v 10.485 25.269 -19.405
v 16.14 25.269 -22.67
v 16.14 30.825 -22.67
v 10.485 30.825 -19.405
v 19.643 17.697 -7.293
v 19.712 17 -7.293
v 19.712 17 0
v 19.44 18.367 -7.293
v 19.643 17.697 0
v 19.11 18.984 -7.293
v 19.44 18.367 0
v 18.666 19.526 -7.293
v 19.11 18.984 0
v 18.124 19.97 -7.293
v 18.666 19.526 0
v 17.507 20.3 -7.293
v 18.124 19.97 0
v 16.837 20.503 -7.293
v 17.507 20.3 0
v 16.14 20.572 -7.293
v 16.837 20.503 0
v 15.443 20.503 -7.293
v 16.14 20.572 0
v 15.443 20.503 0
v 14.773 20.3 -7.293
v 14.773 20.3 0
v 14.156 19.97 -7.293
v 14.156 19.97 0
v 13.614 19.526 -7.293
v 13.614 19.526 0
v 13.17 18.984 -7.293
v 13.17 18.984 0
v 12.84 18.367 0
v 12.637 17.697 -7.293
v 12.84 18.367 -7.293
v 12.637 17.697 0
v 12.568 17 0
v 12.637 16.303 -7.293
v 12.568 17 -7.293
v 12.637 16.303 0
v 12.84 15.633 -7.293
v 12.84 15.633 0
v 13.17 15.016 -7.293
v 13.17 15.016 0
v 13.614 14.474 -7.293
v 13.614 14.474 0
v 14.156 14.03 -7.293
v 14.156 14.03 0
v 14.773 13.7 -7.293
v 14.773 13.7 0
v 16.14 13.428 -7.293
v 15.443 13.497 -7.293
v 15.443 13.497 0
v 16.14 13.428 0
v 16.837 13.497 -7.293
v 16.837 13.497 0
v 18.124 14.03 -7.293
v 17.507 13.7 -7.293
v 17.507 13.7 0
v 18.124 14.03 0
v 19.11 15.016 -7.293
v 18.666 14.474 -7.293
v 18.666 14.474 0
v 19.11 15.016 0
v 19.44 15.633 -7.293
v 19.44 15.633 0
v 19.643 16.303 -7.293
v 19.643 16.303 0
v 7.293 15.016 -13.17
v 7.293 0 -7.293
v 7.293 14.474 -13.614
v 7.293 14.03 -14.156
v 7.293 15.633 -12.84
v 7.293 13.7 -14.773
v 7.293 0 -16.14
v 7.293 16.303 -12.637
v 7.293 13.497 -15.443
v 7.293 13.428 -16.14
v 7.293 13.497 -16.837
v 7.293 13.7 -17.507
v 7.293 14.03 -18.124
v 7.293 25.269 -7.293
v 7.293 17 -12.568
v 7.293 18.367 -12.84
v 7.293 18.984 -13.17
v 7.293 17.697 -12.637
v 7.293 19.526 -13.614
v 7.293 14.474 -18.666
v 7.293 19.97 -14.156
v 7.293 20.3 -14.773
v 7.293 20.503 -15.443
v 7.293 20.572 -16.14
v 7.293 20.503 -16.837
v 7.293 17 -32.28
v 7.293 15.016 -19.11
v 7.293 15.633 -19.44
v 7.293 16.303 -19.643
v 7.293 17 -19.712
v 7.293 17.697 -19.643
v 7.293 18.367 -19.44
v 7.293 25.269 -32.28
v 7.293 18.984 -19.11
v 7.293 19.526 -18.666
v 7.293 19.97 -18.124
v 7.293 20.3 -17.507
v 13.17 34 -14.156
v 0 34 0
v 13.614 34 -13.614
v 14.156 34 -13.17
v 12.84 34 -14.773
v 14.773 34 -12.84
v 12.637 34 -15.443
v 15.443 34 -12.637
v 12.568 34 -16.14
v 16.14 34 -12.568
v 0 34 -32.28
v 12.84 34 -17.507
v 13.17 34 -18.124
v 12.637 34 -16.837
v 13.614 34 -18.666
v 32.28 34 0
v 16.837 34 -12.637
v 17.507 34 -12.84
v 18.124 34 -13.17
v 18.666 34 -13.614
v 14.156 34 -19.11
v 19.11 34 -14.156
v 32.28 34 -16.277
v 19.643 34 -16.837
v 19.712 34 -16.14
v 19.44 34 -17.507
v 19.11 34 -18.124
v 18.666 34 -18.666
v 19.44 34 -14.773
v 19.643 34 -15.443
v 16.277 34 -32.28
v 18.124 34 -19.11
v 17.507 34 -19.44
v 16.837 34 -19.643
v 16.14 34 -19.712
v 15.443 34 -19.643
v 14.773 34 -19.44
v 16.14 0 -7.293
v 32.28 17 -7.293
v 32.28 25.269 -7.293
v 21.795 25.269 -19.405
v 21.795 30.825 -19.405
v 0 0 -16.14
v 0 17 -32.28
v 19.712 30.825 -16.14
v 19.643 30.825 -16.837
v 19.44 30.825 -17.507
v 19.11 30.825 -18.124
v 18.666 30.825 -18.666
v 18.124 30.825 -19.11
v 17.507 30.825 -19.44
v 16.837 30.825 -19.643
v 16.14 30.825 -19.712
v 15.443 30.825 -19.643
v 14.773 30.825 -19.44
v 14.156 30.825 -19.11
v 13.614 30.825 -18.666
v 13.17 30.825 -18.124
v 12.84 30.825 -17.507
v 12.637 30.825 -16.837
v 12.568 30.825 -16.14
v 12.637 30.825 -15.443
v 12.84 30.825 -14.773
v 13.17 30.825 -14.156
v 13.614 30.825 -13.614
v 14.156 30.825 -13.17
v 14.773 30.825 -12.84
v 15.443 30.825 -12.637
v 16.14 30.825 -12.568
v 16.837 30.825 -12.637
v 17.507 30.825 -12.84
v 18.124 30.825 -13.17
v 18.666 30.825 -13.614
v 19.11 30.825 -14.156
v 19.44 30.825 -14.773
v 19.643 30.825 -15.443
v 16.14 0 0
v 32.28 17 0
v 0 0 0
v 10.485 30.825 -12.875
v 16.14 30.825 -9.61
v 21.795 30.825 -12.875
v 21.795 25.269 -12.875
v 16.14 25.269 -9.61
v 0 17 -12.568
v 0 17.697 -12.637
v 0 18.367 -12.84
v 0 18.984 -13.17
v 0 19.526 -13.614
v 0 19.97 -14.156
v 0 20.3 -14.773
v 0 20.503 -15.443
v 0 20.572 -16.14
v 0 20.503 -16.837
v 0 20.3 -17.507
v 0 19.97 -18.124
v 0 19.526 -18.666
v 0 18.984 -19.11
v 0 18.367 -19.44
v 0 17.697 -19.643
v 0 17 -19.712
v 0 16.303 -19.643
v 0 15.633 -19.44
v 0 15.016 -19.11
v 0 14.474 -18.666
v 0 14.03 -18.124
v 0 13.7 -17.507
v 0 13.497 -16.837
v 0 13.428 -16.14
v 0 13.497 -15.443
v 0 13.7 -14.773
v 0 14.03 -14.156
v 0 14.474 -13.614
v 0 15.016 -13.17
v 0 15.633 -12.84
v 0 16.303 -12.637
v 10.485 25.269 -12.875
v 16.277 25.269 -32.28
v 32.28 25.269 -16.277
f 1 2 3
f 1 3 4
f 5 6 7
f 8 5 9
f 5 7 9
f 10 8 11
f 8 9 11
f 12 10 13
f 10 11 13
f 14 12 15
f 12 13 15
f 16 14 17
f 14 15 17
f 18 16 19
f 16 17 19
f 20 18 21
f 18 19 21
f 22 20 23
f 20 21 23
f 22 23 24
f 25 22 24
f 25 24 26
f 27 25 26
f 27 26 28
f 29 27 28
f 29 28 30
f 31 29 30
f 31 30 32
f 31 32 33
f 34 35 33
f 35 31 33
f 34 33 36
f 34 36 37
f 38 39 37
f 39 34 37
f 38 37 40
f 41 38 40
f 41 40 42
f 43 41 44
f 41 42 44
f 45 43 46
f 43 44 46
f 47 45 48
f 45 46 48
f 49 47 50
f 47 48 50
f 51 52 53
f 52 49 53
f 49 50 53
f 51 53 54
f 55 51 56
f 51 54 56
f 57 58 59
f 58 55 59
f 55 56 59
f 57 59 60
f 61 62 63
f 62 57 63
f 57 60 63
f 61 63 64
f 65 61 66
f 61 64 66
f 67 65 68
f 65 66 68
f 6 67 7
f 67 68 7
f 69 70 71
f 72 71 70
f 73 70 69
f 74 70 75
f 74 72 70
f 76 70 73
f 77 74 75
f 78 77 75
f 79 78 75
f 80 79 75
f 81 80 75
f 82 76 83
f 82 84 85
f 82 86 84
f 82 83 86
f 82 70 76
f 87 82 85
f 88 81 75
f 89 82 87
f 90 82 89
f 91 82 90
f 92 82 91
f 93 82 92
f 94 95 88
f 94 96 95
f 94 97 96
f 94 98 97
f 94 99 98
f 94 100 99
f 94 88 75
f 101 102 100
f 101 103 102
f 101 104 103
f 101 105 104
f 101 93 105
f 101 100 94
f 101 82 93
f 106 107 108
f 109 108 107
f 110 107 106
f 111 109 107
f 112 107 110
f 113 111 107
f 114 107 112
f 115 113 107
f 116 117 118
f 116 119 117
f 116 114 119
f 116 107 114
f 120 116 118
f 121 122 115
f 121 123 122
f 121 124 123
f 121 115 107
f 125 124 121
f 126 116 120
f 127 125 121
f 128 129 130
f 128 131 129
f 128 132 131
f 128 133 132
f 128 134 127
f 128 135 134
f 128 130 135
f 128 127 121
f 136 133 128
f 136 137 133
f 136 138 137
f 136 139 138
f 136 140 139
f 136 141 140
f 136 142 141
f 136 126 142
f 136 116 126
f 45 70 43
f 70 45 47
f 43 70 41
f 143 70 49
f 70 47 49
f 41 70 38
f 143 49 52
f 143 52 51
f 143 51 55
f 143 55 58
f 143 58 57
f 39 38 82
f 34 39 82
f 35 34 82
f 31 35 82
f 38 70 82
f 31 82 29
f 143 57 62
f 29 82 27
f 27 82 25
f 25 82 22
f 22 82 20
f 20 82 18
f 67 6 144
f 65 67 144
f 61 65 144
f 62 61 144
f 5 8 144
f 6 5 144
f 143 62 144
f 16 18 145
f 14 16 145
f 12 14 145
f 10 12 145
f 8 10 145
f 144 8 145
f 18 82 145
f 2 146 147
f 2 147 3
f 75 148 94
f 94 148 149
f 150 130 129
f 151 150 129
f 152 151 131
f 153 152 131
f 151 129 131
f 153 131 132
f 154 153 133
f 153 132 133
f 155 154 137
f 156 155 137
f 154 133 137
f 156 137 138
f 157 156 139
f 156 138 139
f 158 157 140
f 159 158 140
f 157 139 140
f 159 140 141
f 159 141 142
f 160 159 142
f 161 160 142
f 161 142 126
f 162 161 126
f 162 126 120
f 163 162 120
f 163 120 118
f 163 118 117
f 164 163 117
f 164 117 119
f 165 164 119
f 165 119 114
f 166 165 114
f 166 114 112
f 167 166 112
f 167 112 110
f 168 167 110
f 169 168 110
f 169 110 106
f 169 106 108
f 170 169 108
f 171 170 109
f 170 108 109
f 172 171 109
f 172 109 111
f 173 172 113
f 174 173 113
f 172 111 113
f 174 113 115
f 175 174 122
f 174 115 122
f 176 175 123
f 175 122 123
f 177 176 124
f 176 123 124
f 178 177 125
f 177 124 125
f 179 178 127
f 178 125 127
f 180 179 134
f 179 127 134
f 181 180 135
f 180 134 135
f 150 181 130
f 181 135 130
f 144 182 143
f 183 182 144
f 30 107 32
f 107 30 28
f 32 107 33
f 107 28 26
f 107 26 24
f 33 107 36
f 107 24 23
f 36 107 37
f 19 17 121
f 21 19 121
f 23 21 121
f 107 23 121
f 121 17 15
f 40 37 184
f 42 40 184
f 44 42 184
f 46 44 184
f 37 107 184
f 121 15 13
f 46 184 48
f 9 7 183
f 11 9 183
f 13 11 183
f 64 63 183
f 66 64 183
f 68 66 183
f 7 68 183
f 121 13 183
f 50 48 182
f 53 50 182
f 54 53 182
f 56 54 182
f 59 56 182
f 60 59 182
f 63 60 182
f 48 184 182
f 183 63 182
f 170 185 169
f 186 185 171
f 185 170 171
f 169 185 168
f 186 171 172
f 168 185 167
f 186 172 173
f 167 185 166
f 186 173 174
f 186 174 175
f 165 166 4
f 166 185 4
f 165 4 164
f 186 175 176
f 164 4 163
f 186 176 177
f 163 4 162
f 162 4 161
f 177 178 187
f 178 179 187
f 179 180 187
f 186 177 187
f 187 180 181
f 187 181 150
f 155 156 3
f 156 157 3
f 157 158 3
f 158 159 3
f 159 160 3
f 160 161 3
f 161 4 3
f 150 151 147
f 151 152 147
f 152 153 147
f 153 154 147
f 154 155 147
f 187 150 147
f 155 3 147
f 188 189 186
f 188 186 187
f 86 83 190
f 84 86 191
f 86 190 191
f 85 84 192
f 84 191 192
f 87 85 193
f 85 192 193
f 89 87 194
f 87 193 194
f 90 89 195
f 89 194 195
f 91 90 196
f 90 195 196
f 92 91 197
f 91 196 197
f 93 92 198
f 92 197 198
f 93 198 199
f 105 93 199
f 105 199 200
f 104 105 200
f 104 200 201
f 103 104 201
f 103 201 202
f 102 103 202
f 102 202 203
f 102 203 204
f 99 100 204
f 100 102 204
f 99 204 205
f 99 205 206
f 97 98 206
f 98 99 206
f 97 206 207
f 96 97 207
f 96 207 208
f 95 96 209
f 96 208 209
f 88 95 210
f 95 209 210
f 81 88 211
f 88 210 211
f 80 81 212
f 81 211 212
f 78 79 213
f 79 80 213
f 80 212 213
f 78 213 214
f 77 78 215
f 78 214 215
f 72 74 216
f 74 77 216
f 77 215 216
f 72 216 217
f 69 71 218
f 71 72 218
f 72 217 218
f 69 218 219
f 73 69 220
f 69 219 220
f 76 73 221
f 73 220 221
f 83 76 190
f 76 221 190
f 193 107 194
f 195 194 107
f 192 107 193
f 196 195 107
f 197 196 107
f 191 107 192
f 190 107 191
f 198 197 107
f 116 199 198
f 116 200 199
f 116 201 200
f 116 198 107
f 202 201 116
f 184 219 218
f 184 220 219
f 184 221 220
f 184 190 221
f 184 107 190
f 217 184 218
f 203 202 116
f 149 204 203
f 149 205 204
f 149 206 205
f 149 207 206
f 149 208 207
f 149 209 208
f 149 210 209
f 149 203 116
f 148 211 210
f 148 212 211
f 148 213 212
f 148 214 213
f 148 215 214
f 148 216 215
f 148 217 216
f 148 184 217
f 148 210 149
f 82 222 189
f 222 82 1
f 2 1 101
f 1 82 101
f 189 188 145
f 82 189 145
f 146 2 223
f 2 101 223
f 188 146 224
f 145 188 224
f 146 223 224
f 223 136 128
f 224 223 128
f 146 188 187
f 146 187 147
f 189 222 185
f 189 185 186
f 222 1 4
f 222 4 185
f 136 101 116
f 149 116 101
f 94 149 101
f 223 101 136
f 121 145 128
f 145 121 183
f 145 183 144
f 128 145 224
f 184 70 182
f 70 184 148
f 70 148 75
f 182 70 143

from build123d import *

# Parameters (mm, degrees)
SKETCH1_W                    = 32.28
SKETCH1_H                    = 32.28
MAIN_BODY_DEPTH              = 34
SKETCH3_R                    = 3.571875
F_9_32_RIGHT_RAIL_DEPTH      = 1
F_9_32_RIGHT_RAIL_DEPTH_BACK = 8.334375
SKETCH4_R                    = 3.571875
F_9_32_LEFT_RAIL_DEPTH       = 8.334375
SKETCH8_R                    = 3.571875
F_9_32_TOPPER_DEPTH          = 1
F_9_32_TOPPER_DEPTH_BACK     = 10
INNER_START                  = -17.4625
SKETCH13_W                   = 24.987421875
SKETCH13_H                   = 24.987421875
INNER_CAVITY_DEPTH           = 8.73125
INNER_CAVITY_DEPTH_BACK      = 34
HEX_START                    = -17
HEX_HOLE_TOP_DEPTH           = 13.825
TOP_CORNER_REACH             = 36
CUT_EXTRUDE2_DEPTH           = 7.292578
CUT_EXTRUDE3_DEPTH           = 7.292578


with BuildPart() as part:
    # Sketch1 → Main Body (new body)
    with BuildSketch(Plane(origin=(0, 0, 0), x_dir=(1, 0, 0), z_dir=(0, 1, 0))):
        with Locations((16.14, 16.14)):
            Rectangle(SKETCH1_W, SKETCH1_H)
    extrude(amount=MAIN_BODY_DEPTH)

    # Sketch3 → 9/32 Right Rail (cut, two sides)
    with BuildSketch(Plane.XY) as f_9_32_right_rail_sk:
        with Locations((16.14, 17)):
            Circle(SKETCH3_R)
    extrude(amount=F_9_32_RIGHT_RAIL_DEPTH, mode=Mode.SUBTRACT)
    extrude(f_9_32_right_rail_sk.sketch, amount=-F_9_32_RIGHT_RAIL_DEPTH_BACK, mode=Mode.SUBTRACT)

    # Sketch4 → 9/32 Left Rail (cut)
    with BuildSketch(Plane.ZY):
        with Locations((-16.14, 17)):
            Circle(SKETCH4_R)
    extrude(amount=-F_9_32_LEFT_RAIL_DEPTH, mode=Mode.SUBTRACT)

    # Sketch8 → 9/32 Topper (cut, two sides)
    with BuildSketch(Plane(origin=(0, 34, 0), x_dir=(1, 0, 0), z_dir=(0, 1, 0))) as f_9_32_topper_sk:
        with Locations((16.14, 16.14)):
            Circle(SKETCH8_R)
    extrude(amount=F_9_32_TOPPER_DEPTH, mode=Mode.SUBTRACT)
    extrude(f_9_32_topper_sk.sketch, amount=-F_9_32_TOPPER_DEPTH_BACK, mode=Mode.SUBTRACT)

    # Sketch13 → Inner Cavity (cut, two sides)
    with BuildSketch(Plane(origin=(0, 34, 0), x_dir=(1, 0, 0), z_dir=(0, 1, 0)).offset(INNER_START)) as inner_cavity_sk:
        with Locations((19.786289062, 19.786289062)):
            Rectangle(SKETCH13_W, SKETCH13_H)
    extrude(amount=INNER_CAVITY_DEPTH, mode=Mode.SUBTRACT)
    extrude(inner_cavity_sk.sketch, amount=-INNER_CAVITY_DEPTH_BACK, mode=Mode.SUBTRACT)

    # Sketch14 → Hex Hole Top (cut)
    with BuildSketch(Plane(origin=(0, 34, 0), x_dir=(1, 0, 0), z_dir=(0, 1, 0)).offset(HEX_START)):
        Polygon((21.79546875, 19.405186405), (16.14, 22.67037281), (10.48453125, 19.405186405), (10.48453125, 12.874813595), (16.14, 9.60962719), (21.79546875, 12.874813595), align=None)
    extrude(amount=HEX_HOLE_TOP_DEPTH, mode=Mode.SUBTRACT)

    # Sketch16 → Top Corner (cut, up to next)
    with BuildSketch(Plane(origin=(0, 34, 0), x_dir=(1, 0, 0), z_dir=(0, 1, 0)), mode=Mode.PRIVATE) as top_corner_sk1:
        Polygon((32.28, 32.28), (16.276714219, 32.28), (32.28, 16.276714219), align=None)
    top_corner_tool1 = extrude(top_corner_sk1.sketch, amount=-TOP_CORNER_REACH, mode=Mode.PRIVATE) & part.part
    add(top_corner_tool1.solids().sort_by_distance((26.945571, 34, -26.945571))[0], mode=Mode.SUBTRACT)

    # Sketch18 → Cut-Extrude2 (cut)
    with BuildSketch(Plane.ZY):
        Polygon((-32.28, 0), (-16.14, 0), (-32.28, 17), align=None)
    extrude(amount=-CUT_EXTRUDE2_DEPTH, mode=Mode.SUBTRACT)

    # Sketch19 → Cut-Extrude3 (cut)
    with BuildSketch(Plane.XY):
        Polygon((32.28, 0), (16.14, 0), (32.28, 17), align=None)
    extrude(amount=-CUT_EXTRUDE3_DEPTH, mode=Mode.SUBTRACT)


solid = part.part
